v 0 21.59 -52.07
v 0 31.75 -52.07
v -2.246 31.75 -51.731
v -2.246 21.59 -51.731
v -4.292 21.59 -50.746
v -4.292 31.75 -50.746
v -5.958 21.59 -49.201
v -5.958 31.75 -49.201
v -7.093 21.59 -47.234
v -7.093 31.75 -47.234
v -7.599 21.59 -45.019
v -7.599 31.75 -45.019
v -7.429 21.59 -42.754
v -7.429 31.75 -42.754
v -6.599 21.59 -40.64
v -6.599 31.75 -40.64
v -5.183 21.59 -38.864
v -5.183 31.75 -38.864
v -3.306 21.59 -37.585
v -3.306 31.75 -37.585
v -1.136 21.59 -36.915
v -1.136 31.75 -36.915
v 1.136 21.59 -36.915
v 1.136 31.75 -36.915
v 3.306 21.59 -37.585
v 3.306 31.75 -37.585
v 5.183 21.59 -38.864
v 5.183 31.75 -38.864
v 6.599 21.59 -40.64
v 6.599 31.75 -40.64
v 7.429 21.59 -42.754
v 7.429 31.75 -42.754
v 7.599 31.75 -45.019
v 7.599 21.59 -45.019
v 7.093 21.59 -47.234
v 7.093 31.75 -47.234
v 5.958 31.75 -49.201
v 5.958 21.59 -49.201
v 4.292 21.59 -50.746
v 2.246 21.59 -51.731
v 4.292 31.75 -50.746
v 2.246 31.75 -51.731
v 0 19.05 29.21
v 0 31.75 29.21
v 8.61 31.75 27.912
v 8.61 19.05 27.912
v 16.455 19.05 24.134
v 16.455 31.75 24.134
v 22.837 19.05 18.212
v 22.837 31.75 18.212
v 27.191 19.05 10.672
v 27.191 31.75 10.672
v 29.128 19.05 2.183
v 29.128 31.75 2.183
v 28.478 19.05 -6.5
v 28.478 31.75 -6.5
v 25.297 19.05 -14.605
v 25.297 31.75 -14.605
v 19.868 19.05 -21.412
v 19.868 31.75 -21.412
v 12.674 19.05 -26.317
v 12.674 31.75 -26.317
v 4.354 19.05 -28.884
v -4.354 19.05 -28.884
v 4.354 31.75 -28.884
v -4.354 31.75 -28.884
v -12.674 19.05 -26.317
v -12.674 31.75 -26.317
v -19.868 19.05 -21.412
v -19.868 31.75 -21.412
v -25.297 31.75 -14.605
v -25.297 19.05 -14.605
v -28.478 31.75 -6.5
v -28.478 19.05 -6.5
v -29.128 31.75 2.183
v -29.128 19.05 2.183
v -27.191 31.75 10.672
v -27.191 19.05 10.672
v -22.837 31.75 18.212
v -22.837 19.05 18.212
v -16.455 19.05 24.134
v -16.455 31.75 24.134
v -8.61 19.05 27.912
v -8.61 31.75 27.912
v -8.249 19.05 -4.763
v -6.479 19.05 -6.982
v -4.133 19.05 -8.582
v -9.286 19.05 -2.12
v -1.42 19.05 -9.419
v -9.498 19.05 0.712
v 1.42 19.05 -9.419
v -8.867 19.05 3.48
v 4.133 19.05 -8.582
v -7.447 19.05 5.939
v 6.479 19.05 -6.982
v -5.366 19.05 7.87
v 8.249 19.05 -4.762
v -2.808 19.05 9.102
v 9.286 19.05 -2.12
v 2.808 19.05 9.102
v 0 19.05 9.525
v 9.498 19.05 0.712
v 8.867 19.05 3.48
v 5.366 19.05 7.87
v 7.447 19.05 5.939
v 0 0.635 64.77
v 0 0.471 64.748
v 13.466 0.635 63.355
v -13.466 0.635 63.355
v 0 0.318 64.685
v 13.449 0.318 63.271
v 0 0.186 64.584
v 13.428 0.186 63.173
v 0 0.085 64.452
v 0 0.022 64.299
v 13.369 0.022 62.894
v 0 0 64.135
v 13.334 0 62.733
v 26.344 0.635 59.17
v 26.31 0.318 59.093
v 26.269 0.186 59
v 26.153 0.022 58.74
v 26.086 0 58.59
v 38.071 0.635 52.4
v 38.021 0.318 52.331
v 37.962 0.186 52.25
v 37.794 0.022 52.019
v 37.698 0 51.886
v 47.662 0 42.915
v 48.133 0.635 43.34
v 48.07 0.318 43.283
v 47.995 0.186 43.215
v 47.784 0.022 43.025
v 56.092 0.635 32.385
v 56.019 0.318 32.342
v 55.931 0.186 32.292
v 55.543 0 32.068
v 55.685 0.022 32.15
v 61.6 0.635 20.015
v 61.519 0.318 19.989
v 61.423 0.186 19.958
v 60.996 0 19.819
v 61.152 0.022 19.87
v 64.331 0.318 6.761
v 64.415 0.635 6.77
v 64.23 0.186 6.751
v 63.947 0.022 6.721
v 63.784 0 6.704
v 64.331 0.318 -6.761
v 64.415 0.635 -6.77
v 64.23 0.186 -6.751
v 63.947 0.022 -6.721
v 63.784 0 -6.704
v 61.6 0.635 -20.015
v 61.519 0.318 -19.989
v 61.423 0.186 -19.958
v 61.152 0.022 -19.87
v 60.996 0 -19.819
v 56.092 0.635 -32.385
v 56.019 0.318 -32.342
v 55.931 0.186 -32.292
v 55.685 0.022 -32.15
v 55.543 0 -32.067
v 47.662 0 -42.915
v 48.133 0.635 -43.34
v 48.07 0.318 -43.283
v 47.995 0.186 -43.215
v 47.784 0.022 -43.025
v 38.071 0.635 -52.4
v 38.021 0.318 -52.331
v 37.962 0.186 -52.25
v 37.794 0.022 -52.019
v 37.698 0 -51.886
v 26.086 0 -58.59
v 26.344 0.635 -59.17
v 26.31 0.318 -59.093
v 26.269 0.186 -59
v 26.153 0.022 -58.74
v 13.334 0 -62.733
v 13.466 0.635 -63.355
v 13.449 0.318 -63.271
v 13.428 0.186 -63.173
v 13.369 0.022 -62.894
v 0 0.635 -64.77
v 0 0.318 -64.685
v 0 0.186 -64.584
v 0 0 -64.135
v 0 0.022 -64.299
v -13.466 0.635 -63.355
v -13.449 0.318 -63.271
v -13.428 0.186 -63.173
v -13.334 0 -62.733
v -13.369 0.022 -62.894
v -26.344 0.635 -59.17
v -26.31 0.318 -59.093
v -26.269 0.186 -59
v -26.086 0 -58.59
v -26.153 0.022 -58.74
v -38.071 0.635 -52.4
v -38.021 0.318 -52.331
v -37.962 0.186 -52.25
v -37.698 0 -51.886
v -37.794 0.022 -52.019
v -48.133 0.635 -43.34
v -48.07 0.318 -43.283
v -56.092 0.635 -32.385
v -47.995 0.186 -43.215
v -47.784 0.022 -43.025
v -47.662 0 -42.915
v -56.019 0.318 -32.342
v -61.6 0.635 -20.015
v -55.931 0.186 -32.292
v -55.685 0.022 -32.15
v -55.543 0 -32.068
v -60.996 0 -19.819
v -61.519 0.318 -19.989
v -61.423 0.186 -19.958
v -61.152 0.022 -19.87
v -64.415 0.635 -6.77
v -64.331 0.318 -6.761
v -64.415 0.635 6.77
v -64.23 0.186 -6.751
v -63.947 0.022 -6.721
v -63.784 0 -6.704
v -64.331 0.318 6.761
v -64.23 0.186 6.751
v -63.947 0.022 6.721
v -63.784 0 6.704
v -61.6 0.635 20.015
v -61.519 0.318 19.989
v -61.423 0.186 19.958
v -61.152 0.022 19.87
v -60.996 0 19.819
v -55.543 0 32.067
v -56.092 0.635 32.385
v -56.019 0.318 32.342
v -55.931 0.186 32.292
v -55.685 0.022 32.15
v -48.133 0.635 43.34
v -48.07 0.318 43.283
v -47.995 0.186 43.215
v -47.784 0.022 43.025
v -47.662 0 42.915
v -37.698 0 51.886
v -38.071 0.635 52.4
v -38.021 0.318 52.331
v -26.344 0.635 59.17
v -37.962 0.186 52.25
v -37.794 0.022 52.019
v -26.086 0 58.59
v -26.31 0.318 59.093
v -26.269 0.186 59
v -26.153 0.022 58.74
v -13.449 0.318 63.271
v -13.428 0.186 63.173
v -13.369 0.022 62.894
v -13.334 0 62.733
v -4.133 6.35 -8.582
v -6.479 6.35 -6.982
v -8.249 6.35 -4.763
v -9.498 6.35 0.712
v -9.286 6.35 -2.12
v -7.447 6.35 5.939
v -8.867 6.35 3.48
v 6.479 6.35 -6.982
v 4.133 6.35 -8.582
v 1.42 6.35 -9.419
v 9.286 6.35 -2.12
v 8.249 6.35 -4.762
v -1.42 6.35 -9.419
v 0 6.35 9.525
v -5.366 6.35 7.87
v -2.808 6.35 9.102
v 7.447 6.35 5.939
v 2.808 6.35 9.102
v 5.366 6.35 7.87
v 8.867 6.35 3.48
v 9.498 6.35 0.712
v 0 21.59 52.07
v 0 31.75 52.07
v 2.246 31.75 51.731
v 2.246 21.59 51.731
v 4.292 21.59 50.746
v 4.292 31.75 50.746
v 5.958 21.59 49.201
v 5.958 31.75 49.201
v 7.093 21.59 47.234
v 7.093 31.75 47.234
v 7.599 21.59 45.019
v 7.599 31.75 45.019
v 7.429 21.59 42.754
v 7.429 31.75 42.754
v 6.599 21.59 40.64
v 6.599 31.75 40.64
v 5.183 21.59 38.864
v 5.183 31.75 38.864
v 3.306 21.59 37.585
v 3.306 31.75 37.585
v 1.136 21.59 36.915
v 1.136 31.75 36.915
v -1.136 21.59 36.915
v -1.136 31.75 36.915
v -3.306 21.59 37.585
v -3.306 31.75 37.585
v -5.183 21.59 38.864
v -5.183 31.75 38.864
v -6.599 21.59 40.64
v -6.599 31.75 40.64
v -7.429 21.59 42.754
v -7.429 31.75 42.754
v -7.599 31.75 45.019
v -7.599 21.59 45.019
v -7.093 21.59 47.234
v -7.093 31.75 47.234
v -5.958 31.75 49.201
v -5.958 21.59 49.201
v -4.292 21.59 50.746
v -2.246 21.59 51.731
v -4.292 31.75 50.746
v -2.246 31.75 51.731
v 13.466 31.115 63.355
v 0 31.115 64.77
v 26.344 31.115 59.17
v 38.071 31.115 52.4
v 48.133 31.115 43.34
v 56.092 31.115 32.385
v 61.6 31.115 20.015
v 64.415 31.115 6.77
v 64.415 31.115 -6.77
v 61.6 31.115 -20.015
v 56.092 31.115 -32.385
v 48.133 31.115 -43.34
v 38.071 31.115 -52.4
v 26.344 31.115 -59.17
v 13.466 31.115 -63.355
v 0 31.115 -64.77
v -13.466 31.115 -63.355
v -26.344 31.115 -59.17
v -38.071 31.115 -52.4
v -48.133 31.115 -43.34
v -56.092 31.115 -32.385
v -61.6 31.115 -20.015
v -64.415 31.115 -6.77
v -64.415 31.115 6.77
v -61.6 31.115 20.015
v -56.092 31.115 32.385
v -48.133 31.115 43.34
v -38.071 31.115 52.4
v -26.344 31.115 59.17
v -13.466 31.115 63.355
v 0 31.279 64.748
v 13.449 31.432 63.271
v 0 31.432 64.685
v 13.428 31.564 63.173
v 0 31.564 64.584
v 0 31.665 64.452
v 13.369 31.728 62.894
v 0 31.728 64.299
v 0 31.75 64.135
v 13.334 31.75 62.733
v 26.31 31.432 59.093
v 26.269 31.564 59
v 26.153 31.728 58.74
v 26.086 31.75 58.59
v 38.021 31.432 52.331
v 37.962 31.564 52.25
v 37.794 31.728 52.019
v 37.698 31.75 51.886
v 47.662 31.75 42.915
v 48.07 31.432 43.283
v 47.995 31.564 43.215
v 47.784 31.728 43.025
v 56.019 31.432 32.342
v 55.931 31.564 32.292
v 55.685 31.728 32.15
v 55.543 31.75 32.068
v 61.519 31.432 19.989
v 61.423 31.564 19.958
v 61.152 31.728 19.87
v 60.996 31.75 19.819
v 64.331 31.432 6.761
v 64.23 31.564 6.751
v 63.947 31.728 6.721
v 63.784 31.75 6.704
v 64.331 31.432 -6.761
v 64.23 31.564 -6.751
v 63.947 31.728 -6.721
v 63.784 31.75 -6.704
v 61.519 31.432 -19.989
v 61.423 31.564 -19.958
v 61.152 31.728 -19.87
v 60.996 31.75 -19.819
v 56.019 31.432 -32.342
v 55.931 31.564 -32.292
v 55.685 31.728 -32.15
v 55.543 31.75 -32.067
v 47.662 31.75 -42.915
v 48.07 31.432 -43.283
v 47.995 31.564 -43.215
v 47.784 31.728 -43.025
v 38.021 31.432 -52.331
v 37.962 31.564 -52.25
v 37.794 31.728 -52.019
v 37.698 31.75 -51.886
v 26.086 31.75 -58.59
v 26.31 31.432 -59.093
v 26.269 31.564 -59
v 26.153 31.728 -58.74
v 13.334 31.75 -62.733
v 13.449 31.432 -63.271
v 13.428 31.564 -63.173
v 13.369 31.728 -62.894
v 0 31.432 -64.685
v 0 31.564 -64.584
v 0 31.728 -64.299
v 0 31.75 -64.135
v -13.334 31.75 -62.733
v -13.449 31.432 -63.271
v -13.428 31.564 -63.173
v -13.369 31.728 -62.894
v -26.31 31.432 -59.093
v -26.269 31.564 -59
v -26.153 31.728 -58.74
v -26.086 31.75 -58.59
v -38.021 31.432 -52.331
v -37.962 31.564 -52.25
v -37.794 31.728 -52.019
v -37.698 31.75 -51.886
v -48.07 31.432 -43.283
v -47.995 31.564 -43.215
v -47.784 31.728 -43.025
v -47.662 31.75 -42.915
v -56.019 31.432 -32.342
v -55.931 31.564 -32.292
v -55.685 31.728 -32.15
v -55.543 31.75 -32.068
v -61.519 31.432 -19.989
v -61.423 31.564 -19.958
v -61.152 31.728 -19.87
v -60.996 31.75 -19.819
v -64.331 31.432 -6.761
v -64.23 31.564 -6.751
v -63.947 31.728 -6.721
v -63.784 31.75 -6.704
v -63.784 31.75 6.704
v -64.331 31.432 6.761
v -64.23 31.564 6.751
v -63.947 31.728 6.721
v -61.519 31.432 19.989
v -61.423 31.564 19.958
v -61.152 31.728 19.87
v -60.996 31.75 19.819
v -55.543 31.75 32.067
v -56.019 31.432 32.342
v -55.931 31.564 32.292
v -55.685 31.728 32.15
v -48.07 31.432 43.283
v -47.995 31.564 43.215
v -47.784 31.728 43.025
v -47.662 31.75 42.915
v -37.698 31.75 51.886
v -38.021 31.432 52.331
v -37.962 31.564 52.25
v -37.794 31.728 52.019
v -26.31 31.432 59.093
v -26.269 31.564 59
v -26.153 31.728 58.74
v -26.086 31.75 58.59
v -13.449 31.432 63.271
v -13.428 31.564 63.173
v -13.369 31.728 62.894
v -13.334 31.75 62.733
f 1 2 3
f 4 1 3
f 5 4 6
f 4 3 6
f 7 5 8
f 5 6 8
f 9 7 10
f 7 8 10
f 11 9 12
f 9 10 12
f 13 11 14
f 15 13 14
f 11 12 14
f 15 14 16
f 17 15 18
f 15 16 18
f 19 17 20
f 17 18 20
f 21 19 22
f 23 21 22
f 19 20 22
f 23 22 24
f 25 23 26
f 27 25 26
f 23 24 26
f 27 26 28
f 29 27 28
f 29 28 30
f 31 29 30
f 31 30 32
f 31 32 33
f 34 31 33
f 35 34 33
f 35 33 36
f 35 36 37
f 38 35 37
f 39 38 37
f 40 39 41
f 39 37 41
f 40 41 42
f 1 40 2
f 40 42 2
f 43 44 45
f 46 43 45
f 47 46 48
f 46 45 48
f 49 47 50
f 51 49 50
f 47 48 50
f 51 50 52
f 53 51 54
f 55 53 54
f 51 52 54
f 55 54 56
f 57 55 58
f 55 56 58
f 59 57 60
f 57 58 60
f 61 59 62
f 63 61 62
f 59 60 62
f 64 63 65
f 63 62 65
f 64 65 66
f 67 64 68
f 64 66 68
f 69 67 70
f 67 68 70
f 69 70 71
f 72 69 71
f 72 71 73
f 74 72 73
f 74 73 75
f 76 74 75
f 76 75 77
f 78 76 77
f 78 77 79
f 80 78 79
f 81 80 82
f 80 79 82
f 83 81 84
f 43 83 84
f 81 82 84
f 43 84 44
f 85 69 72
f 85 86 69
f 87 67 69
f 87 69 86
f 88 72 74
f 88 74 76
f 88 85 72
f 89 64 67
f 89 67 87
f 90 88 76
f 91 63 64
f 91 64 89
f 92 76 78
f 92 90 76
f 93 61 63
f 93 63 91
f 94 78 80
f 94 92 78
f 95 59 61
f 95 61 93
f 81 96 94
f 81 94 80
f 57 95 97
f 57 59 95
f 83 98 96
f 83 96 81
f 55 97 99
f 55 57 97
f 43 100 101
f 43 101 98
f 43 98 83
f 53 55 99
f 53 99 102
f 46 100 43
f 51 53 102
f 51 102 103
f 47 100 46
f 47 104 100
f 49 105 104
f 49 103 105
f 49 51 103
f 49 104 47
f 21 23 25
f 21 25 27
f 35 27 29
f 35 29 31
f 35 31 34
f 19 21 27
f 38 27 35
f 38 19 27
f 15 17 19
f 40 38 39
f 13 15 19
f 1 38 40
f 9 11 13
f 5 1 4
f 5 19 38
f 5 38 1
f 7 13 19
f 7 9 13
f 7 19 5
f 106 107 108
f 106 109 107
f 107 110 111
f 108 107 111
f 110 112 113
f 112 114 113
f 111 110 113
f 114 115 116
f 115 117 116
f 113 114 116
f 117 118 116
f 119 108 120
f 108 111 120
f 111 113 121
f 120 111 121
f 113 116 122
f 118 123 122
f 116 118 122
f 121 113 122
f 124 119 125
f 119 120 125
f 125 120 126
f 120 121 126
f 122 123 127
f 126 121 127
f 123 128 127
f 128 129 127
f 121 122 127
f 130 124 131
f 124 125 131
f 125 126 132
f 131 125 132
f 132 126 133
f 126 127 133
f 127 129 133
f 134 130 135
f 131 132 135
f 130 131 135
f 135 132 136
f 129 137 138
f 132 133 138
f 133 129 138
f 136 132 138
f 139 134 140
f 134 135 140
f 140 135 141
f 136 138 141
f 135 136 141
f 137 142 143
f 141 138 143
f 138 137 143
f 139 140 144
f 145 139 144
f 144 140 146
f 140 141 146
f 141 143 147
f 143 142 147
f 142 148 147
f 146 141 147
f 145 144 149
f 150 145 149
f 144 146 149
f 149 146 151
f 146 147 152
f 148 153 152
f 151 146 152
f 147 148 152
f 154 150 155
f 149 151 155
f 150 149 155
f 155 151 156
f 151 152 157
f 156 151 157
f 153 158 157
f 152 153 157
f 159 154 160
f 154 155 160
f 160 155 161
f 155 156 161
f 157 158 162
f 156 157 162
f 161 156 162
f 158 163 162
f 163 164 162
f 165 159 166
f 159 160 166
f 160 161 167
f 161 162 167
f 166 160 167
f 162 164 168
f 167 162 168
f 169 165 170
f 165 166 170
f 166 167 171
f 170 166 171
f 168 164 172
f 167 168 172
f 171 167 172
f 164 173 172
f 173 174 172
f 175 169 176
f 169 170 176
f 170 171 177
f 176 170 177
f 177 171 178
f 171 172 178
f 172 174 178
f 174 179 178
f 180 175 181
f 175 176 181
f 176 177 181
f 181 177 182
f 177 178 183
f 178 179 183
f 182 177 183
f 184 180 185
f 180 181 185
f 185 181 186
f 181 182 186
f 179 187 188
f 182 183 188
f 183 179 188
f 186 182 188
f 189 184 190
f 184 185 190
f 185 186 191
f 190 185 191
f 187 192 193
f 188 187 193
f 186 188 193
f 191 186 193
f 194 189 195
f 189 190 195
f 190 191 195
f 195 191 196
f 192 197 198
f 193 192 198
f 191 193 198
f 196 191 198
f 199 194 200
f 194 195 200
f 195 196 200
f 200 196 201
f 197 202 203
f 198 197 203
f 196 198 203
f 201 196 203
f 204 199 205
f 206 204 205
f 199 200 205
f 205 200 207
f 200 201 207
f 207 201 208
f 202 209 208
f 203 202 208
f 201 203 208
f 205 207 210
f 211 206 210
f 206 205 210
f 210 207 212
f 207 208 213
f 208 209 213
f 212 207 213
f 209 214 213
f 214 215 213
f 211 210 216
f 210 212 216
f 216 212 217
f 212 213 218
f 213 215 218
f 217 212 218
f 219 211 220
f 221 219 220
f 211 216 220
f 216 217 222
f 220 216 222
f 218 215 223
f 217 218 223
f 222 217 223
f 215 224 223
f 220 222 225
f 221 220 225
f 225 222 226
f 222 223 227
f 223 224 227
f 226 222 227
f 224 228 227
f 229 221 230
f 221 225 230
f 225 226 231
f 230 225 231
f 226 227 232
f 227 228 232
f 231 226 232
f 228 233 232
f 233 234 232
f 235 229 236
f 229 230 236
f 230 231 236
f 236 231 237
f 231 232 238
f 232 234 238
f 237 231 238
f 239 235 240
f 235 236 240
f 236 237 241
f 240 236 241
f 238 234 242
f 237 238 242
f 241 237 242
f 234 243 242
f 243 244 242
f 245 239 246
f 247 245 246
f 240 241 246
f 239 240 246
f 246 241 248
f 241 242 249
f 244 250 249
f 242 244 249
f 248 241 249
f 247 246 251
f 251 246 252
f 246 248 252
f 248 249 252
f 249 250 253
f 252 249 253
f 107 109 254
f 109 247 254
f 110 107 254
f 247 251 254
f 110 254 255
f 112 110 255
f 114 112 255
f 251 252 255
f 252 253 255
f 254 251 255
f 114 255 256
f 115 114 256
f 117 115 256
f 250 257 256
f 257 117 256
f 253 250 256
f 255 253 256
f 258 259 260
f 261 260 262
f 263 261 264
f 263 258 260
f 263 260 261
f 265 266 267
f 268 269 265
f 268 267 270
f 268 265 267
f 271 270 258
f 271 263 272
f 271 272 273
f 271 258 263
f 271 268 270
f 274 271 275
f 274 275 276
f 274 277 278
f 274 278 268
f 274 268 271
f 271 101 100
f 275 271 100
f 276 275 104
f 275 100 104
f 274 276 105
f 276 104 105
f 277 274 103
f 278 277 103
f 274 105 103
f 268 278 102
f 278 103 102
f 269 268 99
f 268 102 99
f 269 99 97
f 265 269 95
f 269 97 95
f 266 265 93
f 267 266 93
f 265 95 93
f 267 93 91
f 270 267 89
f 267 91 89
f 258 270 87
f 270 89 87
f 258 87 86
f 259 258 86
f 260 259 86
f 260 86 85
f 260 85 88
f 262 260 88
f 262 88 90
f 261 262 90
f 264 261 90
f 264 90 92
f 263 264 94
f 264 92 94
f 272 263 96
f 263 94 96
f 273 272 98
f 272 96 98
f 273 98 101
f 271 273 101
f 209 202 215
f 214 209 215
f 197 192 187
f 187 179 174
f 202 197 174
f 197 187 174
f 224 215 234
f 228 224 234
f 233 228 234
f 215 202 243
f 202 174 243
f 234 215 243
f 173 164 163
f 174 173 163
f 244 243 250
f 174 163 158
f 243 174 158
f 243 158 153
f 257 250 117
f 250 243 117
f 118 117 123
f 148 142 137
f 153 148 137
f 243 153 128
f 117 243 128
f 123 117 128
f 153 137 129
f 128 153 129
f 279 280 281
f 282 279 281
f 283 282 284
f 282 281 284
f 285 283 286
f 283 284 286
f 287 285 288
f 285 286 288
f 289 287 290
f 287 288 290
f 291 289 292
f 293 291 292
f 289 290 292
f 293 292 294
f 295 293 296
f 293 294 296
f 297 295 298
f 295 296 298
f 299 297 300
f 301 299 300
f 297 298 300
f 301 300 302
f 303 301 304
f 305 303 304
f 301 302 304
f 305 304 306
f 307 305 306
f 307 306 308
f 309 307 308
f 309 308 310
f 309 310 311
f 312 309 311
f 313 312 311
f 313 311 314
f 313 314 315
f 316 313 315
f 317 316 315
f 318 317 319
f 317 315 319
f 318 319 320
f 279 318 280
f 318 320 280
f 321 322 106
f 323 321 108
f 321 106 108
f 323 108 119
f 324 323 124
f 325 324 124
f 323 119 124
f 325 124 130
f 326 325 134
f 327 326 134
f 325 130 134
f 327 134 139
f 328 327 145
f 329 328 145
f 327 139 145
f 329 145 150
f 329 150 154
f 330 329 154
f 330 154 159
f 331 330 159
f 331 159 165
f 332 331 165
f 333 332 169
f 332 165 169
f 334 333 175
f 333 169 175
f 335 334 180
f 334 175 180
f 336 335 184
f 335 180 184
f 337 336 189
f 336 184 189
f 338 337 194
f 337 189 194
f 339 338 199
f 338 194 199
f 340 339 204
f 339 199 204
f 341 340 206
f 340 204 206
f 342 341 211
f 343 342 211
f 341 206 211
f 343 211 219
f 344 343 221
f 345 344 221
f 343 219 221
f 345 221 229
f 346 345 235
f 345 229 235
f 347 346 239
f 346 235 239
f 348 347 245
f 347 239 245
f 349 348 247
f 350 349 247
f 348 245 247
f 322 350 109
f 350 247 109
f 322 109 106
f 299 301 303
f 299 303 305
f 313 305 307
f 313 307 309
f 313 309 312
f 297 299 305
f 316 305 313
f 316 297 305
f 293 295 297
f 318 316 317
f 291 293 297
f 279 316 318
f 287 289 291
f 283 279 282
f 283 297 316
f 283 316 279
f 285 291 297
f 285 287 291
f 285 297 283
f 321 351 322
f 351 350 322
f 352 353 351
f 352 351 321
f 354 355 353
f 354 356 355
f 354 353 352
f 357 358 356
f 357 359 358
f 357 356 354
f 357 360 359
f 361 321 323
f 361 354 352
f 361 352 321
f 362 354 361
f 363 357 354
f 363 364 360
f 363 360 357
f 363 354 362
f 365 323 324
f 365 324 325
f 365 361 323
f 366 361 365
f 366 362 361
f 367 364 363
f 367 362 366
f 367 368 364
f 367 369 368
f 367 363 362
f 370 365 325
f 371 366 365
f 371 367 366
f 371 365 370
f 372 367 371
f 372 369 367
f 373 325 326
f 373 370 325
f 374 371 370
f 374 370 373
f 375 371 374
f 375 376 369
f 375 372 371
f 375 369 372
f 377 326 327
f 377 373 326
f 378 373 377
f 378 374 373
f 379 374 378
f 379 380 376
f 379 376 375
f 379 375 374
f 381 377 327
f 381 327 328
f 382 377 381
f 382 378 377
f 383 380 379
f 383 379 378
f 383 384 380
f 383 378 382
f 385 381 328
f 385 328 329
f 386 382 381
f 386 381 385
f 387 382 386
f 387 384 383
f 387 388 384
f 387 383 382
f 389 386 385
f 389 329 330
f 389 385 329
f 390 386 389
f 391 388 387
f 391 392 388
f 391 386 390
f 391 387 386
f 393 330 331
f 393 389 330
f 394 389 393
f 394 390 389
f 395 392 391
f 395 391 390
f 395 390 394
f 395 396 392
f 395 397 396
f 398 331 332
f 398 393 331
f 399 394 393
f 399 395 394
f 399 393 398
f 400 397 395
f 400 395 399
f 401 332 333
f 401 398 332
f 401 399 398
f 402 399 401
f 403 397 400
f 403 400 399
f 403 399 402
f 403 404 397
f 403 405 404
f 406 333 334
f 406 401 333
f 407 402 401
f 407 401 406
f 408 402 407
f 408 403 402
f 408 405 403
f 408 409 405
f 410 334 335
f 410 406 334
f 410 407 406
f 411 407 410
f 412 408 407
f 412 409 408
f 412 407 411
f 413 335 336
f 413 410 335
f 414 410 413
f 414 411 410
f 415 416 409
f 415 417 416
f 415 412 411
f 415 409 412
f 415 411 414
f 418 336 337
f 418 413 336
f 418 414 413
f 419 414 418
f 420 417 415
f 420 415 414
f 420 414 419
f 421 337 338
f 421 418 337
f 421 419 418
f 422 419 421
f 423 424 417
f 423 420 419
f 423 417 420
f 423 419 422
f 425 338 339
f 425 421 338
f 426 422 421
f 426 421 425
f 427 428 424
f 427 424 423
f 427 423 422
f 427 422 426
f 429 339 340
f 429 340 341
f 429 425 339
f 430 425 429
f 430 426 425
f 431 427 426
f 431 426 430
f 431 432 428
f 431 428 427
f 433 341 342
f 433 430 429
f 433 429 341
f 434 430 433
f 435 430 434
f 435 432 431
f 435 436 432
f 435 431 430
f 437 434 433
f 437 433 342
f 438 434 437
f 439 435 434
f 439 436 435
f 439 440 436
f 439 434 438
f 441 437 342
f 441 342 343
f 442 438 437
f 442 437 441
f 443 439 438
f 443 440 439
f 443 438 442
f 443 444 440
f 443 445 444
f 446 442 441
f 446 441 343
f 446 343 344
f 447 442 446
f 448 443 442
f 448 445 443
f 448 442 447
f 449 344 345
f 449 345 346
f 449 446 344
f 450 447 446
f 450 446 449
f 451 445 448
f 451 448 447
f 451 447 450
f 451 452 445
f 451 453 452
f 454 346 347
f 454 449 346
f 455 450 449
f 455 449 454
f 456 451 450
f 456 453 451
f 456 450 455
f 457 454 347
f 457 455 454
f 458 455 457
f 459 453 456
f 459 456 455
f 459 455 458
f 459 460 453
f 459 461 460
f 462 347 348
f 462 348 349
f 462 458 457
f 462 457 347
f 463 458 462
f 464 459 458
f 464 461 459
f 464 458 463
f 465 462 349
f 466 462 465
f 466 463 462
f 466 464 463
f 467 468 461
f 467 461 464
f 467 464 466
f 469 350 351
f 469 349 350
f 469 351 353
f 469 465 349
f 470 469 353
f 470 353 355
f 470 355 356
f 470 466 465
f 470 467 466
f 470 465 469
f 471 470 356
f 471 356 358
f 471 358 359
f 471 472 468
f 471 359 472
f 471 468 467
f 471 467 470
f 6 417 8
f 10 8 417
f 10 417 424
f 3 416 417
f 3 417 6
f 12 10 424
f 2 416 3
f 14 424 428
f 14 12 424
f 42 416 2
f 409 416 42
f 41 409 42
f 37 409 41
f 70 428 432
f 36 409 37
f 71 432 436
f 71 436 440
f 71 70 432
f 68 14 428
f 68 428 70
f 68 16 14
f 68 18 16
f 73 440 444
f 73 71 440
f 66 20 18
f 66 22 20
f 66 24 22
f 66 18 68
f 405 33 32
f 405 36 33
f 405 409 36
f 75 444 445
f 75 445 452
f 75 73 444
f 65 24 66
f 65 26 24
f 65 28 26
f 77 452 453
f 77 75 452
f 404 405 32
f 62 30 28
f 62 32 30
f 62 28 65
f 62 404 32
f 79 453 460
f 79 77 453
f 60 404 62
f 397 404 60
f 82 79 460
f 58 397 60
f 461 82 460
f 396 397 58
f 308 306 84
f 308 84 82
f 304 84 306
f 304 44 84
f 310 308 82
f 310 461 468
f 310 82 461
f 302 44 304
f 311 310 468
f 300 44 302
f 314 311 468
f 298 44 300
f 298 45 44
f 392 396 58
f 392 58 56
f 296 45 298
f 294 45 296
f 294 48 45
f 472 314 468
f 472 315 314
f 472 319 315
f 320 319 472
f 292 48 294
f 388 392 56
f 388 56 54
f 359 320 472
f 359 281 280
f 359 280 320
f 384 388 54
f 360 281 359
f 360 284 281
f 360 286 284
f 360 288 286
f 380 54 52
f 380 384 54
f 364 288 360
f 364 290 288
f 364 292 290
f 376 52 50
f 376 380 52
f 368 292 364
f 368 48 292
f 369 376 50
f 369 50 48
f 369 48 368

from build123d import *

# Parameters (mm, degrees)
SKETCH2_R           = 64.77
BOSS_EXTRUDE1_DEPTH = 31.75
FILLET1_R           = 0.635
SKETCH3_R           = 29.21
CUT_EXTRUDE1_DEPTH  = 12.7
SKETCH4_R           = 9.525
CUT_EXTRUDE2_DEPTH  = 12.7
SKETCH5_R           = 7.62
CUT_EXTRUDE3_DEPTH  = 10.16


with BuildPart() as part:
    # Sketch2 → Boss-Extrude1 (new body)
    with BuildSketch(Plane(origin=(0, 0, 0), x_dir=(1, 0, 0), z_dir=(0, 1, 0))):
        with Locations(Location((0, 0, 0), (0, 0, 270))):
            Circle(SKETCH2_R)
    extrude(amount=BOSS_EXTRUDE1_DEPTH)

    # Fillet1
    fillet1_edges = [part.edges().sort_by_distance(p)[0] for p in [
        (0, 0, -64.77),
        (0, 31.75, -64.77),
    ]]
    fillet(fillet1_edges, radius=FILLET1_R)

    # Sketch3 → Cut-Extrude1 (cut)
    with BuildSketch(Plane(origin=(0, 31.75, 0), x_dir=(1, 0, 0), z_dir=(0, 1, 0))):
        with Locations(Location((0, 0, 0), (0, 0, 270))):
            Circle(SKETCH3_R)
    extrude(amount=-CUT_EXTRUDE1_DEPTH, mode=Mode.SUBTRACT)

    # Sketch4 → Cut-Extrude2 (cut)
    with BuildSketch(Plane(origin=(0, 19.05, 0), x_dir=(1, 0, 0), z_dir=(0, 1, 0))):
        with Locations(Location((0, 0, 0), (0, 0, 270))):
            Circle(SKETCH4_R)
    extrude(amount=-CUT_EXTRUDE2_DEPTH, mode=Mode.SUBTRACT)

    # Sketch5 → Cut-Extrude3 (cut)
    with BuildSketch(Plane(origin=(0, 31.75, 0), x_dir=(1, 0, 0), z_dir=(0, 1, 0))):
        with Locations(Location((0, -44.45, 0), (0, 0, 270))):
            Circle(SKETCH5_R)
        with Locations(Location((0, 44.45, 0), (0, 0, 90))):
            Circle(SKETCH5_R)
    extrude(amount=-CUT_EXTRUDE3_DEPTH, mode=Mode.SUBTRACT)


solid = part.part
